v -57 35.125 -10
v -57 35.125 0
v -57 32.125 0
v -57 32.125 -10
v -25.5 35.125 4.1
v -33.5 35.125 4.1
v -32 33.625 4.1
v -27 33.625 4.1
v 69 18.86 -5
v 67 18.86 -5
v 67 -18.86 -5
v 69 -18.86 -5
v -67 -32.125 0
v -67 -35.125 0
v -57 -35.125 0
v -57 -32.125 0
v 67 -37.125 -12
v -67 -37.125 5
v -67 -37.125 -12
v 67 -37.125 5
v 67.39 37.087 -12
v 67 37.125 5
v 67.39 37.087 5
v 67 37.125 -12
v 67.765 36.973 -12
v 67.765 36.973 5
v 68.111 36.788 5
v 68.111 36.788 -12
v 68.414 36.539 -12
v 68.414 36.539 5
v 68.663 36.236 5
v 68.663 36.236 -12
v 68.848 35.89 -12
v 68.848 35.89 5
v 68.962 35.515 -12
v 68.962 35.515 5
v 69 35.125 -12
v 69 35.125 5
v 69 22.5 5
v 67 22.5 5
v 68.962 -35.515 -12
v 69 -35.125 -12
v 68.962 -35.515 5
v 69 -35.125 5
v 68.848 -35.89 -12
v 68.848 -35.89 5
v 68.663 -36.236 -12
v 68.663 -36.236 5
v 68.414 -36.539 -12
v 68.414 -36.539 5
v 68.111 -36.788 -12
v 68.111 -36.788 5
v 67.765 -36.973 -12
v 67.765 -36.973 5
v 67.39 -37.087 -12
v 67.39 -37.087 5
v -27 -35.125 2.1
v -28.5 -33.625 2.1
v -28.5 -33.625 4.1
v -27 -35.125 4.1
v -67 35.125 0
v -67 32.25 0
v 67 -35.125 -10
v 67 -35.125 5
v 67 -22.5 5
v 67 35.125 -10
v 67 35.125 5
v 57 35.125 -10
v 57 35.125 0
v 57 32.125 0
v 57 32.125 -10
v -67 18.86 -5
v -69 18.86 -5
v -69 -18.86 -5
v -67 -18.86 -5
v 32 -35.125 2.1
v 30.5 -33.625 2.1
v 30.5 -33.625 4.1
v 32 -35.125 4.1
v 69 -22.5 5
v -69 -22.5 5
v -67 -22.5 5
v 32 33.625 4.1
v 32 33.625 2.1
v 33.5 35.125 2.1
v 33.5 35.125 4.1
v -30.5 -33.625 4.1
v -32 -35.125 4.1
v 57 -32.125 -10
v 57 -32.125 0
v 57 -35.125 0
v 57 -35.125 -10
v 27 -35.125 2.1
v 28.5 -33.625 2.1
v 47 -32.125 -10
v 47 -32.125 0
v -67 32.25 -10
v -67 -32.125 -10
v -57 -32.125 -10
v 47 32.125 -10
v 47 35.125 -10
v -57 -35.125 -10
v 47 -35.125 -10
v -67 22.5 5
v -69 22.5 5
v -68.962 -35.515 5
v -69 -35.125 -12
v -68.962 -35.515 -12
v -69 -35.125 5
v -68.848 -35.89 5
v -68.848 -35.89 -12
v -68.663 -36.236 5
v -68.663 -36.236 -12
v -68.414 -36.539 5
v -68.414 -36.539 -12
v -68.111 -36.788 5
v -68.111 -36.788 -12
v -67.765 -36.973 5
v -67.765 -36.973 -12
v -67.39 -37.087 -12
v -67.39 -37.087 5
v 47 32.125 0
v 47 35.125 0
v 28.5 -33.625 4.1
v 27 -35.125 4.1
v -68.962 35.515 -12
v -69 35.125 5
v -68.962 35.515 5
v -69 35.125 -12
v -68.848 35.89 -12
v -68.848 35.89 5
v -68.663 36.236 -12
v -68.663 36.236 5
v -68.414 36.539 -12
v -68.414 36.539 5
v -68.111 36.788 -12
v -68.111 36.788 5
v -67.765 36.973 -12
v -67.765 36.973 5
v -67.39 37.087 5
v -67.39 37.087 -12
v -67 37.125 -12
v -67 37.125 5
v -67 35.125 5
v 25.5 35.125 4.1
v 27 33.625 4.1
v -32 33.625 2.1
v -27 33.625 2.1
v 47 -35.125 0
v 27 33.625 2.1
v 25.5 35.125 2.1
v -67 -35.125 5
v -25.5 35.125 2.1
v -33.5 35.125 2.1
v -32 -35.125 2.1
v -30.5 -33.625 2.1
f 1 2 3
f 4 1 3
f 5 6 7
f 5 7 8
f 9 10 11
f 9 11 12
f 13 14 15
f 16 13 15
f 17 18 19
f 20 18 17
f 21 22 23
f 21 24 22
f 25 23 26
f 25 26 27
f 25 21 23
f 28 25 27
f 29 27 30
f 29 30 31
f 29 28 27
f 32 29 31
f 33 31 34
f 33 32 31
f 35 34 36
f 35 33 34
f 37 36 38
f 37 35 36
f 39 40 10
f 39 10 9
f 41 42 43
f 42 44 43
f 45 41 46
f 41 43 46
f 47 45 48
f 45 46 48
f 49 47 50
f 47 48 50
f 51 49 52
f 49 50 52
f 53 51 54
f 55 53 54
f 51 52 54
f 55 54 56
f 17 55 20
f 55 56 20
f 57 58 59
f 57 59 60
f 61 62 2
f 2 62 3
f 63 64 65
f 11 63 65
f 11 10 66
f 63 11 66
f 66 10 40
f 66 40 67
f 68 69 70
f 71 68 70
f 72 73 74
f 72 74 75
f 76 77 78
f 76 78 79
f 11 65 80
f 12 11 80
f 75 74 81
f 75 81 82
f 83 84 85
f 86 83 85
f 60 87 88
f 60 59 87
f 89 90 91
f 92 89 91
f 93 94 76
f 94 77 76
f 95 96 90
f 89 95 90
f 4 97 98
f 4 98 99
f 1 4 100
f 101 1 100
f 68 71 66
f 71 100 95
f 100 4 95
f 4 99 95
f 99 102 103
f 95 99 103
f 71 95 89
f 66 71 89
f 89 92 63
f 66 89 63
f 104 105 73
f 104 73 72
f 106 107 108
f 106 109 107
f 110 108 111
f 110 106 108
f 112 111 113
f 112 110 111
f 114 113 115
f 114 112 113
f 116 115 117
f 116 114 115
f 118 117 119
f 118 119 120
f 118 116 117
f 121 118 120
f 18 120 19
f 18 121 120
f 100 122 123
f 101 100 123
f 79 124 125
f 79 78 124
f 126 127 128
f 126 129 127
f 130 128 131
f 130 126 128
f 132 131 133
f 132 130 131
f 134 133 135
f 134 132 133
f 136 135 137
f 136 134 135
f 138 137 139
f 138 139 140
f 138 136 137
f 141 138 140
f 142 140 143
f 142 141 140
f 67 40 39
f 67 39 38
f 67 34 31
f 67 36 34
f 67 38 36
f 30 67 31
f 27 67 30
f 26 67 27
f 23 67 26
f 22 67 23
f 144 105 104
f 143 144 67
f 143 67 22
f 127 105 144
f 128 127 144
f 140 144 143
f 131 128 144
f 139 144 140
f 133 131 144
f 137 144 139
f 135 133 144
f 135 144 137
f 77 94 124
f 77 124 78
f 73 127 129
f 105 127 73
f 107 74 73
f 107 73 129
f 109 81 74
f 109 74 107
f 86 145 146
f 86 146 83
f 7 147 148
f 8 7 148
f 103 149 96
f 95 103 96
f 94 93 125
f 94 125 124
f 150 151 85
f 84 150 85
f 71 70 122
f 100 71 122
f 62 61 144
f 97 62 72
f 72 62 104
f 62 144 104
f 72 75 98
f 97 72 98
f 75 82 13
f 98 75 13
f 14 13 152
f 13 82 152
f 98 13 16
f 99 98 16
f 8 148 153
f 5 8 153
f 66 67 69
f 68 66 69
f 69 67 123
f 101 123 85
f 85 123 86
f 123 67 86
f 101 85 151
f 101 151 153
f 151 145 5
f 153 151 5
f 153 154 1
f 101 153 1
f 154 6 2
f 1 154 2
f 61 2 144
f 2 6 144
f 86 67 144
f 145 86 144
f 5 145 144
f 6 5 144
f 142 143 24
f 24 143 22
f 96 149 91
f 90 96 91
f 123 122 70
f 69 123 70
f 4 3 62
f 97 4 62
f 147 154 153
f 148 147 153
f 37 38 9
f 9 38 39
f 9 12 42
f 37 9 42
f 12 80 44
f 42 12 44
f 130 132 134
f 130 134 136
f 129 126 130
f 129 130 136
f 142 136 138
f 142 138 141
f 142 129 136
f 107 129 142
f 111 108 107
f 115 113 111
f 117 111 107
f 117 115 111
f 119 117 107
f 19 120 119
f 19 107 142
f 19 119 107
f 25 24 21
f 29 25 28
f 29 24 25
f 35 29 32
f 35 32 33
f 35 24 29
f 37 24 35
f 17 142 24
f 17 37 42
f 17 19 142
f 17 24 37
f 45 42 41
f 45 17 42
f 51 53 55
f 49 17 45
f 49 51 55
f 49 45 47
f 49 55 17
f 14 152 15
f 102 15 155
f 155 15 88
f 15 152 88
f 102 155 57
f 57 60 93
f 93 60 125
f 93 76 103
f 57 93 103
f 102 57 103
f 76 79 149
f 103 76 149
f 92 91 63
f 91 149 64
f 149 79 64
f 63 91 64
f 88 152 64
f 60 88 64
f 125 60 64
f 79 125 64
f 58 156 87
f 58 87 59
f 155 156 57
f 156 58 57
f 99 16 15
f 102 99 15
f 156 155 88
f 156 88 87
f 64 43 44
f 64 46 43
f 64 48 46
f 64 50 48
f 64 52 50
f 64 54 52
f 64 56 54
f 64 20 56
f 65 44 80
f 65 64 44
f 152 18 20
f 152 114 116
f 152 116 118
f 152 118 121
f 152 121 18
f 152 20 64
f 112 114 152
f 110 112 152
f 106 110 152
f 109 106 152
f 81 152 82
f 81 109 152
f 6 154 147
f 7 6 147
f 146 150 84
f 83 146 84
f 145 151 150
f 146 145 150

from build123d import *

# Parameters (mm, degrees)
SKETCH1_W                            = 74.25
SKETCH1_H                            = 138
SKETCH1_W_2                          = 70.25
SKETCH1_H_2                          = 134
BOSS_EXTRUDE1_BOARD_4MM_DEPTH        = 5
SKETCH2_W                            = 138
SKETCH2_H                            = 74.25
BOSS_EXTRUDE2_UNDER_10MS_DEPTH       = 10
SKETCH3_W                            = 138
SKETCH3_H                            = 74.25
BOSS_EXTRUDE3_BOTTOM_COVER_2MM_DEPTH = 2
SKETCH4_W                            = 5
SKETCH4_H                            = 3.5
BOSS_EXTRUDE4_4PINS_DEPTH            = 2
SKETCH5_W                            = 150
SKETCH5_H                            = 45
CUT_EXTRUDE1_CUT_USB_DEPTH           = 10
CUT_EXTRUDE1_CUT_USB_DRAFT           = -20
FILLET1_R                            = 2
CHAMFER2_START                       = 2.1
CHAMFER2_DEPTH                       = 2
CHAMFER2_2_DEPTH                     = 2


with BuildPart() as part:
    # Sketch1 → Boss-Extrude1-board-4mm (new body)
    with BuildSketch(Plane(origin=(0, 0, 0), x_dir=(0, 1, 0), z_dir=(0, 0, 1))):
        Rectangle(SKETCH1_W, SKETCH1_H)
        Rectangle(SKETCH1_W_2, SKETCH1_H_2, mode=Mode.SUBTRACT)
    extrude(amount=BOSS_EXTRUDE1_BOARD_4MM_DEPTH)

    # Sketch2 → Boss-Extrude2-under-10ms (add)
    with BuildSketch(Plane(origin=(0, 0, 0), x_dir=(1, 0, 0), z_dir=(0, 0, -1))):
        Rectangle(SKETCH2_W, SKETCH2_H)
        Polygon((-67, 32.125), (-57, 32.125), (-57, 35.125), (47, 35.125), (47, 32.125), (57, 32.125), (57, 35.125), (67, 35.125), (67, -35.125), (57, -35.125), (57, -32.125), (47, -32.125), (47, -35.125), (-57, -35.125), (-57, -32.125), (-67, -32.25), align=None, mode=Mode.SUBTRACT)
    extrude(amount=BOSS_EXTRUDE2_UNDER_10MS_DEPTH)

    # Sketch3 → Boss-Extrude3-bottom-cover-2mm (add)
    with BuildSketch(Plane(origin=(0, 0, -10), x_dir=(1, 0, 0), z_dir=(0, 0, -1))):
        Rectangle(SKETCH3_W, SKETCH3_H)
    extrude(amount=BOSS_EXTRUDE3_BOTTOM_COVER_2MM_DEPTH)

    # Sketch4 → Boss-Extrude4-4pins (add)
    with BuildSketch(Plane.XY.offset(2.1)):
        with Locations((-29.5, 35.375)):
            Rectangle(SKETCH4_W, SKETCH4_H)
        with Locations((-29.5, -35.375)):
            Rectangle(SKETCH4_W, SKETCH4_H)
        with Locations((29.5, -35.375)):
            Rectangle(SKETCH4_W, SKETCH4_H)
        with Locations((29.5, 35.375)):
            Rectangle(SKETCH4_W, SKETCH4_H)
    extrude(amount=BOSS_EXTRUDE4_4PINS_DEPTH)


with BuildPart() as cut_extrude1_cut_usb_tool:
    # Sketch5 → Cut-Extrude1-cut-usb (with draft: the straight prism first)
    with BuildSketch(Plane.XY.offset(5)):
        Rectangle(SKETCH5_W, SKETCH5_H)
    extrude(amount=-CUT_EXTRUDE1_CUT_USB_DEPTH)
    # Cut-Extrude1-cut-usb: the draft: its side faces are tilted about the plane it starts from
    cut_extrude1_cut_usb_sides = [cut_extrude1_cut_usb_tool.faces().sort_by_distance(p)[0] for p in [
        (0, -22.5, 0),
        (75, 0, 0),
        (0, 22.5, 0),
        (-75, 0, 0),
    ]]
    draft(cut_extrude1_cut_usb_sides, Plane.XY.offset(5), CUT_EXTRUDE1_CUT_USB_DRAFT)


with BuildPart() as part_1:
    add(part.part)

    # Cut-Extrude1-cut-usb: cut by cut_extrude1_cut_usb_tool
    add(cut_extrude1_cut_usb_tool.part, mode=Mode.SUBTRACT)

    # Fillet1
    fillet1_edges = [part_1.edges().sort_by_distance(p)[0] for p in [
        (69, -37.125, -3.5),
        (-69, -37.125, -3.5),
        (-69, 37.125, -3.5),
        (69, 37.125, -3.5),
    ]]
    fillet(fillet1_edges, radius=FILLET1_R)

    # Chamfer2: read off the stored shape, not the designer's step
    # Chamfer2 outline → Chamfer2 (cut)
    with BuildSketch(Plane.XY.offset(CHAMFER2_START)):
        Polygon((-32, -33.625), (-32, -35.125), (-30.5, -33.625), align=None)
        Polygon((-27, -33.625), (-28.5, -33.625), (-27, -35.125), align=None)
        Polygon((27, -33.625), (27, -35.125), (28.5, -33.625), align=None)
        Polygon((32, -33.625), (30.5, -33.625), (32, -35.125), align=None)
    extrude(amount=CHAMFER2_DEPTH, mode=Mode.SUBTRACT)

    # Chamfer2 2 outline → Chamfer2 2 (add)
    with BuildSketch(Plane.XY.offset(CHAMFER2_START)):
        Polygon((-32, 33.625), (-32, 35.125), (-33.5, 35.125), align=None)
        Polygon((-27, 33.625), (-25.5, 35.125), (-27, 35.125), align=None)
        Polygon((33.5, 35.125), (32, 35.125), (32, 33.625), align=None)
        Polygon((25.5, 35.125), (27, 33.625), (27, 35.125), align=None)
    extrude(amount=CHAMFER2_2_DEPTH)


solid = part_1.part
